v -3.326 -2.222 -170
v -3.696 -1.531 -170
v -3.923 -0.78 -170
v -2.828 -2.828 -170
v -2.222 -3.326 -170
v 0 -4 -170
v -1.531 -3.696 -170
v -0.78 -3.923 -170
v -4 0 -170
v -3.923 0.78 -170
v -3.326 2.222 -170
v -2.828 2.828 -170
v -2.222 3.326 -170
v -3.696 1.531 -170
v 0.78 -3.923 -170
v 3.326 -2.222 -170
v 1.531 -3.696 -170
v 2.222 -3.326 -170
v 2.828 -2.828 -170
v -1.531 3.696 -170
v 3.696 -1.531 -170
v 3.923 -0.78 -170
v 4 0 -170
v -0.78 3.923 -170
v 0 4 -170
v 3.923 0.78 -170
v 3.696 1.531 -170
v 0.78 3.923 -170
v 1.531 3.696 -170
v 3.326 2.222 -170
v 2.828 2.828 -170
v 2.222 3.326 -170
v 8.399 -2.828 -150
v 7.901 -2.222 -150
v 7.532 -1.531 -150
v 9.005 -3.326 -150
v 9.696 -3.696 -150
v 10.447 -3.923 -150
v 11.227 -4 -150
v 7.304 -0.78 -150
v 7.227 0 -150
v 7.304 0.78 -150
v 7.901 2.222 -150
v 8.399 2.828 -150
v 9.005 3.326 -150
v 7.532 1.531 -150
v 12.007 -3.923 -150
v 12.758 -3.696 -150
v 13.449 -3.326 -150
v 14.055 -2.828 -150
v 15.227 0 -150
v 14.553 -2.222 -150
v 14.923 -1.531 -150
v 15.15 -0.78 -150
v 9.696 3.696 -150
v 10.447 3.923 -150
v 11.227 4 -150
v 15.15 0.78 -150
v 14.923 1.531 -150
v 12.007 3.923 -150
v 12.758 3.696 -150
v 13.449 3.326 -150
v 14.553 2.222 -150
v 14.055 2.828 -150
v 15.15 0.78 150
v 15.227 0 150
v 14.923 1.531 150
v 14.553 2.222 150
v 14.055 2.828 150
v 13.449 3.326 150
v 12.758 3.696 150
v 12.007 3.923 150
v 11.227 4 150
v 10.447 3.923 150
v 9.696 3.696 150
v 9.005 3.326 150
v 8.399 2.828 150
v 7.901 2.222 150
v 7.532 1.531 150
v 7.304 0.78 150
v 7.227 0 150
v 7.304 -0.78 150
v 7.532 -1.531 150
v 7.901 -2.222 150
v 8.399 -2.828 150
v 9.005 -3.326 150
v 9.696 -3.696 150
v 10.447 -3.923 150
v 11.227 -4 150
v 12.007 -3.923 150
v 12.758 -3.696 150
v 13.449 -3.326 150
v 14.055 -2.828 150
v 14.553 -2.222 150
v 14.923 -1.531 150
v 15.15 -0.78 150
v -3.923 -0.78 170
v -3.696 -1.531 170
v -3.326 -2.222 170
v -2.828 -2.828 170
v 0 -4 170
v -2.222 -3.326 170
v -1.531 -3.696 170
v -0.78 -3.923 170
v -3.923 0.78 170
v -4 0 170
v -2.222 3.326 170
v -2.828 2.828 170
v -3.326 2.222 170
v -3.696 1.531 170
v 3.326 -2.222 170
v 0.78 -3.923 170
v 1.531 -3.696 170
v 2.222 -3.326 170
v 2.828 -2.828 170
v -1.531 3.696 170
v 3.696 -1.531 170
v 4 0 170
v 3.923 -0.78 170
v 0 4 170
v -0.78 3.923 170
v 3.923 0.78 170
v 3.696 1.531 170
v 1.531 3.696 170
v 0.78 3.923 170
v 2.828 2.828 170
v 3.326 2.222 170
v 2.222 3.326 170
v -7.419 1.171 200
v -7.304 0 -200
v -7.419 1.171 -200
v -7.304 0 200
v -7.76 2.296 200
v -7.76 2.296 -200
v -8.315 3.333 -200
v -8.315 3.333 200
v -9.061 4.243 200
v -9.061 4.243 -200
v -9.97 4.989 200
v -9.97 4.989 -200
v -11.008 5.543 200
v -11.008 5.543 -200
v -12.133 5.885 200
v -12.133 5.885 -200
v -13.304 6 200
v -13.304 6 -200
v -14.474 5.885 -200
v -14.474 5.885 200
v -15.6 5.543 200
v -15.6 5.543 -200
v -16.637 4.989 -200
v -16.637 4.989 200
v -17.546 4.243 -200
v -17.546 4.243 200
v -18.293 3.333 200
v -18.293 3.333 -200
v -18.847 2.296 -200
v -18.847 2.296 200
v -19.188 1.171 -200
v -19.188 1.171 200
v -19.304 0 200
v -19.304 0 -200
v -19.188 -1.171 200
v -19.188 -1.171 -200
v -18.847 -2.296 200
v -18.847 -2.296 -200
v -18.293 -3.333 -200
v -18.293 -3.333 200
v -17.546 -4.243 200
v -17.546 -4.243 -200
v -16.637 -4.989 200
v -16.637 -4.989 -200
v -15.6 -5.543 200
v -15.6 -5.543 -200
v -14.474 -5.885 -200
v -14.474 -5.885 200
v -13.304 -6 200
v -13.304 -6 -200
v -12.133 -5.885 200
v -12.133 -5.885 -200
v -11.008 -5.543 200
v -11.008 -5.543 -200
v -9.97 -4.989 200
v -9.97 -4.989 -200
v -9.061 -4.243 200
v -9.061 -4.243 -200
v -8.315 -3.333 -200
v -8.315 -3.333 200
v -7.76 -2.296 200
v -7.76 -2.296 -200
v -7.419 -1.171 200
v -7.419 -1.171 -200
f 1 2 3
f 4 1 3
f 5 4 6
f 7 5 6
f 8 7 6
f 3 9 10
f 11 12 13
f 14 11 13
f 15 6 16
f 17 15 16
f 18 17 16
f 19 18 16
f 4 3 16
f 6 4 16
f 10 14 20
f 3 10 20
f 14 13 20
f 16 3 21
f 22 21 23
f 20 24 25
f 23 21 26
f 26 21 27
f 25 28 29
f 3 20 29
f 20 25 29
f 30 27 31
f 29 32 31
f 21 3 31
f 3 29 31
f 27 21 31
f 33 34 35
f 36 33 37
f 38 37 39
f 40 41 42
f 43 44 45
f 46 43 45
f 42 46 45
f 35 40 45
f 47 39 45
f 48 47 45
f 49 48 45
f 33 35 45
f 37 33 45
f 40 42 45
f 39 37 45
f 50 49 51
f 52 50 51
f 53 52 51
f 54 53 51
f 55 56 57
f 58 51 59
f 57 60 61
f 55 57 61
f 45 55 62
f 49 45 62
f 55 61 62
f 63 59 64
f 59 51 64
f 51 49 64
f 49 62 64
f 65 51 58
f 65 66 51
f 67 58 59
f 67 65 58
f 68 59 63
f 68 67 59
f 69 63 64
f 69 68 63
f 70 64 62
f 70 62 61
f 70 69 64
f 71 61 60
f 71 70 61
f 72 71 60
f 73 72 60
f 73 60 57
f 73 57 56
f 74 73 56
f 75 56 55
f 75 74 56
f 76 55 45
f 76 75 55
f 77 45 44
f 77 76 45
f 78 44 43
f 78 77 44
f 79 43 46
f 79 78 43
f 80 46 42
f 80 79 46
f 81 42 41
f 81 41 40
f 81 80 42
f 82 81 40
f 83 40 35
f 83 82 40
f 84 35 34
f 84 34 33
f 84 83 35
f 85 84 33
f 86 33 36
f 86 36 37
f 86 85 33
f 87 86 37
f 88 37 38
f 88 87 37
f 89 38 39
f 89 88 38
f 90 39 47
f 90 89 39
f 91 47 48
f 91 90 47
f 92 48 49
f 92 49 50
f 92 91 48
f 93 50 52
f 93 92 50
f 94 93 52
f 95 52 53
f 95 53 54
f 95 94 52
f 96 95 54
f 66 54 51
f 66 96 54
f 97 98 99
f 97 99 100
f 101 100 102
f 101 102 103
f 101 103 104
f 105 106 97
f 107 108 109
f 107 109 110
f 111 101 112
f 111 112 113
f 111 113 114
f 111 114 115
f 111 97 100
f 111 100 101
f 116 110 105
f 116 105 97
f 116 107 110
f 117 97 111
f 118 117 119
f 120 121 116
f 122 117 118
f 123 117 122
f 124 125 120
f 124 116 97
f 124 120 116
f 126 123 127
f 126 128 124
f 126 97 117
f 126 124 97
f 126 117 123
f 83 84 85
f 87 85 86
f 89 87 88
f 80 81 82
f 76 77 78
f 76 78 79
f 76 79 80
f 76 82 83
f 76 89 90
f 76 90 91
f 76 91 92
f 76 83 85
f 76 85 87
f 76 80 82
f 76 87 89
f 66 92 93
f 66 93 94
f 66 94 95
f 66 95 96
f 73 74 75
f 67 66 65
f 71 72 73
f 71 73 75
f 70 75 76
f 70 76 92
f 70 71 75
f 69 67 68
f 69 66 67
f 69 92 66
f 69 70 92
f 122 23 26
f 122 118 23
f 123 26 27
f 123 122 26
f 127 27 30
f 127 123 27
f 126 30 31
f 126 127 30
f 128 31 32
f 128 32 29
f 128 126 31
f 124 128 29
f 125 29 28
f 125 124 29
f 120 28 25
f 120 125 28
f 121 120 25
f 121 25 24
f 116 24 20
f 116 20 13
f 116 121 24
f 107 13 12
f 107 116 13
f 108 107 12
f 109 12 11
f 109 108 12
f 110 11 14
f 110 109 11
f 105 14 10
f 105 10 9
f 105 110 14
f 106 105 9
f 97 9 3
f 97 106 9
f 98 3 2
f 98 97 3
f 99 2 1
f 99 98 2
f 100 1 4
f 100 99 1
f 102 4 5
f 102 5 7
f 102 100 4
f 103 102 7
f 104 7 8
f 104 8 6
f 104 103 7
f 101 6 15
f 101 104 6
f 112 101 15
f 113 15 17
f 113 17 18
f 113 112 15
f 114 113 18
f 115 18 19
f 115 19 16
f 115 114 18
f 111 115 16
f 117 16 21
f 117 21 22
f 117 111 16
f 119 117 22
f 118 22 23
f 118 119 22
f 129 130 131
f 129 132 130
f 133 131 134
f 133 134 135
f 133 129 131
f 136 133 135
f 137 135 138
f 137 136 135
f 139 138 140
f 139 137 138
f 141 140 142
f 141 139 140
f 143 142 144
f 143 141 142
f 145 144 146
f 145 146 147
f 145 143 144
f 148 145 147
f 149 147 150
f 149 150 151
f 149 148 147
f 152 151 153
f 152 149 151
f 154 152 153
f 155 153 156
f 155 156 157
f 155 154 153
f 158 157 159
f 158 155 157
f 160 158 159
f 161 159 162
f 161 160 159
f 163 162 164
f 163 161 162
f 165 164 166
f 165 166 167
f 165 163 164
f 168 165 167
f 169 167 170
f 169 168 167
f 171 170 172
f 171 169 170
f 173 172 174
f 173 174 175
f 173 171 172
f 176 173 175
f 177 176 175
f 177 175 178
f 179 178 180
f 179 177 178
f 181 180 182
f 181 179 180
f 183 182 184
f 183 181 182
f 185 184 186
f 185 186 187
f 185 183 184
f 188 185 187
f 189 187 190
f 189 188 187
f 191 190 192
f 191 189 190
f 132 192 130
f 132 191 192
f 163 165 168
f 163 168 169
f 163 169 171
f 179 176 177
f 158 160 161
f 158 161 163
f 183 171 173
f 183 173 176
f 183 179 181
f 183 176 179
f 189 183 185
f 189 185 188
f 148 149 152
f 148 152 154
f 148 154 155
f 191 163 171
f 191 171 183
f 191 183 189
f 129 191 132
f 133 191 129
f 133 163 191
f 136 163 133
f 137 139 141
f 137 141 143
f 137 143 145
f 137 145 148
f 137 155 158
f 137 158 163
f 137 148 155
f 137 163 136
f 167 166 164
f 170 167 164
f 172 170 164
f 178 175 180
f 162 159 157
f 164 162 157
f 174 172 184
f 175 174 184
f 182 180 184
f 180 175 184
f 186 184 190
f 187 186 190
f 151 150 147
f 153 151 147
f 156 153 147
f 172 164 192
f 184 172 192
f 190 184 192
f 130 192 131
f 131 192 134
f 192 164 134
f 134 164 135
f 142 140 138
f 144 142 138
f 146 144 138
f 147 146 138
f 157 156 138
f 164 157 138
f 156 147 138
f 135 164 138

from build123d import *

# Parameters (mm, degrees)
F0_R     = 6
F1_DEPTH = 200
F0_R_2   = 4
F2_DEPTH = 170
F3_DEPTH = 150


with BuildPart() as f1:
    # F0 (on Top) → F1 (new body, symmetric)
    with BuildSketch(Plane.XY):
        with Locations((-13.3037072906, 0)):
            Circle(F0_R)
    extrude(amount=F1_DEPTH, both=True)


with BuildPart() as f2:
    # F0 (on Top) → F2 (new body, symmetric)
    with BuildSketch(Plane.XY):
        Circle(F0_R_2)
    extrude(amount=F2_DEPTH, both=True)


with BuildPart() as f3:
    # F0 (on Top) → F3 (new body, symmetric)
    with BuildSketch(Plane.XY):
        with Locations((11.2270306294, 0)):
            Circle(F0_R_2)
    extrude(amount=F3_DEPTH, both=True)


solid = Compound([f1.part, f2.part, f3.part])
